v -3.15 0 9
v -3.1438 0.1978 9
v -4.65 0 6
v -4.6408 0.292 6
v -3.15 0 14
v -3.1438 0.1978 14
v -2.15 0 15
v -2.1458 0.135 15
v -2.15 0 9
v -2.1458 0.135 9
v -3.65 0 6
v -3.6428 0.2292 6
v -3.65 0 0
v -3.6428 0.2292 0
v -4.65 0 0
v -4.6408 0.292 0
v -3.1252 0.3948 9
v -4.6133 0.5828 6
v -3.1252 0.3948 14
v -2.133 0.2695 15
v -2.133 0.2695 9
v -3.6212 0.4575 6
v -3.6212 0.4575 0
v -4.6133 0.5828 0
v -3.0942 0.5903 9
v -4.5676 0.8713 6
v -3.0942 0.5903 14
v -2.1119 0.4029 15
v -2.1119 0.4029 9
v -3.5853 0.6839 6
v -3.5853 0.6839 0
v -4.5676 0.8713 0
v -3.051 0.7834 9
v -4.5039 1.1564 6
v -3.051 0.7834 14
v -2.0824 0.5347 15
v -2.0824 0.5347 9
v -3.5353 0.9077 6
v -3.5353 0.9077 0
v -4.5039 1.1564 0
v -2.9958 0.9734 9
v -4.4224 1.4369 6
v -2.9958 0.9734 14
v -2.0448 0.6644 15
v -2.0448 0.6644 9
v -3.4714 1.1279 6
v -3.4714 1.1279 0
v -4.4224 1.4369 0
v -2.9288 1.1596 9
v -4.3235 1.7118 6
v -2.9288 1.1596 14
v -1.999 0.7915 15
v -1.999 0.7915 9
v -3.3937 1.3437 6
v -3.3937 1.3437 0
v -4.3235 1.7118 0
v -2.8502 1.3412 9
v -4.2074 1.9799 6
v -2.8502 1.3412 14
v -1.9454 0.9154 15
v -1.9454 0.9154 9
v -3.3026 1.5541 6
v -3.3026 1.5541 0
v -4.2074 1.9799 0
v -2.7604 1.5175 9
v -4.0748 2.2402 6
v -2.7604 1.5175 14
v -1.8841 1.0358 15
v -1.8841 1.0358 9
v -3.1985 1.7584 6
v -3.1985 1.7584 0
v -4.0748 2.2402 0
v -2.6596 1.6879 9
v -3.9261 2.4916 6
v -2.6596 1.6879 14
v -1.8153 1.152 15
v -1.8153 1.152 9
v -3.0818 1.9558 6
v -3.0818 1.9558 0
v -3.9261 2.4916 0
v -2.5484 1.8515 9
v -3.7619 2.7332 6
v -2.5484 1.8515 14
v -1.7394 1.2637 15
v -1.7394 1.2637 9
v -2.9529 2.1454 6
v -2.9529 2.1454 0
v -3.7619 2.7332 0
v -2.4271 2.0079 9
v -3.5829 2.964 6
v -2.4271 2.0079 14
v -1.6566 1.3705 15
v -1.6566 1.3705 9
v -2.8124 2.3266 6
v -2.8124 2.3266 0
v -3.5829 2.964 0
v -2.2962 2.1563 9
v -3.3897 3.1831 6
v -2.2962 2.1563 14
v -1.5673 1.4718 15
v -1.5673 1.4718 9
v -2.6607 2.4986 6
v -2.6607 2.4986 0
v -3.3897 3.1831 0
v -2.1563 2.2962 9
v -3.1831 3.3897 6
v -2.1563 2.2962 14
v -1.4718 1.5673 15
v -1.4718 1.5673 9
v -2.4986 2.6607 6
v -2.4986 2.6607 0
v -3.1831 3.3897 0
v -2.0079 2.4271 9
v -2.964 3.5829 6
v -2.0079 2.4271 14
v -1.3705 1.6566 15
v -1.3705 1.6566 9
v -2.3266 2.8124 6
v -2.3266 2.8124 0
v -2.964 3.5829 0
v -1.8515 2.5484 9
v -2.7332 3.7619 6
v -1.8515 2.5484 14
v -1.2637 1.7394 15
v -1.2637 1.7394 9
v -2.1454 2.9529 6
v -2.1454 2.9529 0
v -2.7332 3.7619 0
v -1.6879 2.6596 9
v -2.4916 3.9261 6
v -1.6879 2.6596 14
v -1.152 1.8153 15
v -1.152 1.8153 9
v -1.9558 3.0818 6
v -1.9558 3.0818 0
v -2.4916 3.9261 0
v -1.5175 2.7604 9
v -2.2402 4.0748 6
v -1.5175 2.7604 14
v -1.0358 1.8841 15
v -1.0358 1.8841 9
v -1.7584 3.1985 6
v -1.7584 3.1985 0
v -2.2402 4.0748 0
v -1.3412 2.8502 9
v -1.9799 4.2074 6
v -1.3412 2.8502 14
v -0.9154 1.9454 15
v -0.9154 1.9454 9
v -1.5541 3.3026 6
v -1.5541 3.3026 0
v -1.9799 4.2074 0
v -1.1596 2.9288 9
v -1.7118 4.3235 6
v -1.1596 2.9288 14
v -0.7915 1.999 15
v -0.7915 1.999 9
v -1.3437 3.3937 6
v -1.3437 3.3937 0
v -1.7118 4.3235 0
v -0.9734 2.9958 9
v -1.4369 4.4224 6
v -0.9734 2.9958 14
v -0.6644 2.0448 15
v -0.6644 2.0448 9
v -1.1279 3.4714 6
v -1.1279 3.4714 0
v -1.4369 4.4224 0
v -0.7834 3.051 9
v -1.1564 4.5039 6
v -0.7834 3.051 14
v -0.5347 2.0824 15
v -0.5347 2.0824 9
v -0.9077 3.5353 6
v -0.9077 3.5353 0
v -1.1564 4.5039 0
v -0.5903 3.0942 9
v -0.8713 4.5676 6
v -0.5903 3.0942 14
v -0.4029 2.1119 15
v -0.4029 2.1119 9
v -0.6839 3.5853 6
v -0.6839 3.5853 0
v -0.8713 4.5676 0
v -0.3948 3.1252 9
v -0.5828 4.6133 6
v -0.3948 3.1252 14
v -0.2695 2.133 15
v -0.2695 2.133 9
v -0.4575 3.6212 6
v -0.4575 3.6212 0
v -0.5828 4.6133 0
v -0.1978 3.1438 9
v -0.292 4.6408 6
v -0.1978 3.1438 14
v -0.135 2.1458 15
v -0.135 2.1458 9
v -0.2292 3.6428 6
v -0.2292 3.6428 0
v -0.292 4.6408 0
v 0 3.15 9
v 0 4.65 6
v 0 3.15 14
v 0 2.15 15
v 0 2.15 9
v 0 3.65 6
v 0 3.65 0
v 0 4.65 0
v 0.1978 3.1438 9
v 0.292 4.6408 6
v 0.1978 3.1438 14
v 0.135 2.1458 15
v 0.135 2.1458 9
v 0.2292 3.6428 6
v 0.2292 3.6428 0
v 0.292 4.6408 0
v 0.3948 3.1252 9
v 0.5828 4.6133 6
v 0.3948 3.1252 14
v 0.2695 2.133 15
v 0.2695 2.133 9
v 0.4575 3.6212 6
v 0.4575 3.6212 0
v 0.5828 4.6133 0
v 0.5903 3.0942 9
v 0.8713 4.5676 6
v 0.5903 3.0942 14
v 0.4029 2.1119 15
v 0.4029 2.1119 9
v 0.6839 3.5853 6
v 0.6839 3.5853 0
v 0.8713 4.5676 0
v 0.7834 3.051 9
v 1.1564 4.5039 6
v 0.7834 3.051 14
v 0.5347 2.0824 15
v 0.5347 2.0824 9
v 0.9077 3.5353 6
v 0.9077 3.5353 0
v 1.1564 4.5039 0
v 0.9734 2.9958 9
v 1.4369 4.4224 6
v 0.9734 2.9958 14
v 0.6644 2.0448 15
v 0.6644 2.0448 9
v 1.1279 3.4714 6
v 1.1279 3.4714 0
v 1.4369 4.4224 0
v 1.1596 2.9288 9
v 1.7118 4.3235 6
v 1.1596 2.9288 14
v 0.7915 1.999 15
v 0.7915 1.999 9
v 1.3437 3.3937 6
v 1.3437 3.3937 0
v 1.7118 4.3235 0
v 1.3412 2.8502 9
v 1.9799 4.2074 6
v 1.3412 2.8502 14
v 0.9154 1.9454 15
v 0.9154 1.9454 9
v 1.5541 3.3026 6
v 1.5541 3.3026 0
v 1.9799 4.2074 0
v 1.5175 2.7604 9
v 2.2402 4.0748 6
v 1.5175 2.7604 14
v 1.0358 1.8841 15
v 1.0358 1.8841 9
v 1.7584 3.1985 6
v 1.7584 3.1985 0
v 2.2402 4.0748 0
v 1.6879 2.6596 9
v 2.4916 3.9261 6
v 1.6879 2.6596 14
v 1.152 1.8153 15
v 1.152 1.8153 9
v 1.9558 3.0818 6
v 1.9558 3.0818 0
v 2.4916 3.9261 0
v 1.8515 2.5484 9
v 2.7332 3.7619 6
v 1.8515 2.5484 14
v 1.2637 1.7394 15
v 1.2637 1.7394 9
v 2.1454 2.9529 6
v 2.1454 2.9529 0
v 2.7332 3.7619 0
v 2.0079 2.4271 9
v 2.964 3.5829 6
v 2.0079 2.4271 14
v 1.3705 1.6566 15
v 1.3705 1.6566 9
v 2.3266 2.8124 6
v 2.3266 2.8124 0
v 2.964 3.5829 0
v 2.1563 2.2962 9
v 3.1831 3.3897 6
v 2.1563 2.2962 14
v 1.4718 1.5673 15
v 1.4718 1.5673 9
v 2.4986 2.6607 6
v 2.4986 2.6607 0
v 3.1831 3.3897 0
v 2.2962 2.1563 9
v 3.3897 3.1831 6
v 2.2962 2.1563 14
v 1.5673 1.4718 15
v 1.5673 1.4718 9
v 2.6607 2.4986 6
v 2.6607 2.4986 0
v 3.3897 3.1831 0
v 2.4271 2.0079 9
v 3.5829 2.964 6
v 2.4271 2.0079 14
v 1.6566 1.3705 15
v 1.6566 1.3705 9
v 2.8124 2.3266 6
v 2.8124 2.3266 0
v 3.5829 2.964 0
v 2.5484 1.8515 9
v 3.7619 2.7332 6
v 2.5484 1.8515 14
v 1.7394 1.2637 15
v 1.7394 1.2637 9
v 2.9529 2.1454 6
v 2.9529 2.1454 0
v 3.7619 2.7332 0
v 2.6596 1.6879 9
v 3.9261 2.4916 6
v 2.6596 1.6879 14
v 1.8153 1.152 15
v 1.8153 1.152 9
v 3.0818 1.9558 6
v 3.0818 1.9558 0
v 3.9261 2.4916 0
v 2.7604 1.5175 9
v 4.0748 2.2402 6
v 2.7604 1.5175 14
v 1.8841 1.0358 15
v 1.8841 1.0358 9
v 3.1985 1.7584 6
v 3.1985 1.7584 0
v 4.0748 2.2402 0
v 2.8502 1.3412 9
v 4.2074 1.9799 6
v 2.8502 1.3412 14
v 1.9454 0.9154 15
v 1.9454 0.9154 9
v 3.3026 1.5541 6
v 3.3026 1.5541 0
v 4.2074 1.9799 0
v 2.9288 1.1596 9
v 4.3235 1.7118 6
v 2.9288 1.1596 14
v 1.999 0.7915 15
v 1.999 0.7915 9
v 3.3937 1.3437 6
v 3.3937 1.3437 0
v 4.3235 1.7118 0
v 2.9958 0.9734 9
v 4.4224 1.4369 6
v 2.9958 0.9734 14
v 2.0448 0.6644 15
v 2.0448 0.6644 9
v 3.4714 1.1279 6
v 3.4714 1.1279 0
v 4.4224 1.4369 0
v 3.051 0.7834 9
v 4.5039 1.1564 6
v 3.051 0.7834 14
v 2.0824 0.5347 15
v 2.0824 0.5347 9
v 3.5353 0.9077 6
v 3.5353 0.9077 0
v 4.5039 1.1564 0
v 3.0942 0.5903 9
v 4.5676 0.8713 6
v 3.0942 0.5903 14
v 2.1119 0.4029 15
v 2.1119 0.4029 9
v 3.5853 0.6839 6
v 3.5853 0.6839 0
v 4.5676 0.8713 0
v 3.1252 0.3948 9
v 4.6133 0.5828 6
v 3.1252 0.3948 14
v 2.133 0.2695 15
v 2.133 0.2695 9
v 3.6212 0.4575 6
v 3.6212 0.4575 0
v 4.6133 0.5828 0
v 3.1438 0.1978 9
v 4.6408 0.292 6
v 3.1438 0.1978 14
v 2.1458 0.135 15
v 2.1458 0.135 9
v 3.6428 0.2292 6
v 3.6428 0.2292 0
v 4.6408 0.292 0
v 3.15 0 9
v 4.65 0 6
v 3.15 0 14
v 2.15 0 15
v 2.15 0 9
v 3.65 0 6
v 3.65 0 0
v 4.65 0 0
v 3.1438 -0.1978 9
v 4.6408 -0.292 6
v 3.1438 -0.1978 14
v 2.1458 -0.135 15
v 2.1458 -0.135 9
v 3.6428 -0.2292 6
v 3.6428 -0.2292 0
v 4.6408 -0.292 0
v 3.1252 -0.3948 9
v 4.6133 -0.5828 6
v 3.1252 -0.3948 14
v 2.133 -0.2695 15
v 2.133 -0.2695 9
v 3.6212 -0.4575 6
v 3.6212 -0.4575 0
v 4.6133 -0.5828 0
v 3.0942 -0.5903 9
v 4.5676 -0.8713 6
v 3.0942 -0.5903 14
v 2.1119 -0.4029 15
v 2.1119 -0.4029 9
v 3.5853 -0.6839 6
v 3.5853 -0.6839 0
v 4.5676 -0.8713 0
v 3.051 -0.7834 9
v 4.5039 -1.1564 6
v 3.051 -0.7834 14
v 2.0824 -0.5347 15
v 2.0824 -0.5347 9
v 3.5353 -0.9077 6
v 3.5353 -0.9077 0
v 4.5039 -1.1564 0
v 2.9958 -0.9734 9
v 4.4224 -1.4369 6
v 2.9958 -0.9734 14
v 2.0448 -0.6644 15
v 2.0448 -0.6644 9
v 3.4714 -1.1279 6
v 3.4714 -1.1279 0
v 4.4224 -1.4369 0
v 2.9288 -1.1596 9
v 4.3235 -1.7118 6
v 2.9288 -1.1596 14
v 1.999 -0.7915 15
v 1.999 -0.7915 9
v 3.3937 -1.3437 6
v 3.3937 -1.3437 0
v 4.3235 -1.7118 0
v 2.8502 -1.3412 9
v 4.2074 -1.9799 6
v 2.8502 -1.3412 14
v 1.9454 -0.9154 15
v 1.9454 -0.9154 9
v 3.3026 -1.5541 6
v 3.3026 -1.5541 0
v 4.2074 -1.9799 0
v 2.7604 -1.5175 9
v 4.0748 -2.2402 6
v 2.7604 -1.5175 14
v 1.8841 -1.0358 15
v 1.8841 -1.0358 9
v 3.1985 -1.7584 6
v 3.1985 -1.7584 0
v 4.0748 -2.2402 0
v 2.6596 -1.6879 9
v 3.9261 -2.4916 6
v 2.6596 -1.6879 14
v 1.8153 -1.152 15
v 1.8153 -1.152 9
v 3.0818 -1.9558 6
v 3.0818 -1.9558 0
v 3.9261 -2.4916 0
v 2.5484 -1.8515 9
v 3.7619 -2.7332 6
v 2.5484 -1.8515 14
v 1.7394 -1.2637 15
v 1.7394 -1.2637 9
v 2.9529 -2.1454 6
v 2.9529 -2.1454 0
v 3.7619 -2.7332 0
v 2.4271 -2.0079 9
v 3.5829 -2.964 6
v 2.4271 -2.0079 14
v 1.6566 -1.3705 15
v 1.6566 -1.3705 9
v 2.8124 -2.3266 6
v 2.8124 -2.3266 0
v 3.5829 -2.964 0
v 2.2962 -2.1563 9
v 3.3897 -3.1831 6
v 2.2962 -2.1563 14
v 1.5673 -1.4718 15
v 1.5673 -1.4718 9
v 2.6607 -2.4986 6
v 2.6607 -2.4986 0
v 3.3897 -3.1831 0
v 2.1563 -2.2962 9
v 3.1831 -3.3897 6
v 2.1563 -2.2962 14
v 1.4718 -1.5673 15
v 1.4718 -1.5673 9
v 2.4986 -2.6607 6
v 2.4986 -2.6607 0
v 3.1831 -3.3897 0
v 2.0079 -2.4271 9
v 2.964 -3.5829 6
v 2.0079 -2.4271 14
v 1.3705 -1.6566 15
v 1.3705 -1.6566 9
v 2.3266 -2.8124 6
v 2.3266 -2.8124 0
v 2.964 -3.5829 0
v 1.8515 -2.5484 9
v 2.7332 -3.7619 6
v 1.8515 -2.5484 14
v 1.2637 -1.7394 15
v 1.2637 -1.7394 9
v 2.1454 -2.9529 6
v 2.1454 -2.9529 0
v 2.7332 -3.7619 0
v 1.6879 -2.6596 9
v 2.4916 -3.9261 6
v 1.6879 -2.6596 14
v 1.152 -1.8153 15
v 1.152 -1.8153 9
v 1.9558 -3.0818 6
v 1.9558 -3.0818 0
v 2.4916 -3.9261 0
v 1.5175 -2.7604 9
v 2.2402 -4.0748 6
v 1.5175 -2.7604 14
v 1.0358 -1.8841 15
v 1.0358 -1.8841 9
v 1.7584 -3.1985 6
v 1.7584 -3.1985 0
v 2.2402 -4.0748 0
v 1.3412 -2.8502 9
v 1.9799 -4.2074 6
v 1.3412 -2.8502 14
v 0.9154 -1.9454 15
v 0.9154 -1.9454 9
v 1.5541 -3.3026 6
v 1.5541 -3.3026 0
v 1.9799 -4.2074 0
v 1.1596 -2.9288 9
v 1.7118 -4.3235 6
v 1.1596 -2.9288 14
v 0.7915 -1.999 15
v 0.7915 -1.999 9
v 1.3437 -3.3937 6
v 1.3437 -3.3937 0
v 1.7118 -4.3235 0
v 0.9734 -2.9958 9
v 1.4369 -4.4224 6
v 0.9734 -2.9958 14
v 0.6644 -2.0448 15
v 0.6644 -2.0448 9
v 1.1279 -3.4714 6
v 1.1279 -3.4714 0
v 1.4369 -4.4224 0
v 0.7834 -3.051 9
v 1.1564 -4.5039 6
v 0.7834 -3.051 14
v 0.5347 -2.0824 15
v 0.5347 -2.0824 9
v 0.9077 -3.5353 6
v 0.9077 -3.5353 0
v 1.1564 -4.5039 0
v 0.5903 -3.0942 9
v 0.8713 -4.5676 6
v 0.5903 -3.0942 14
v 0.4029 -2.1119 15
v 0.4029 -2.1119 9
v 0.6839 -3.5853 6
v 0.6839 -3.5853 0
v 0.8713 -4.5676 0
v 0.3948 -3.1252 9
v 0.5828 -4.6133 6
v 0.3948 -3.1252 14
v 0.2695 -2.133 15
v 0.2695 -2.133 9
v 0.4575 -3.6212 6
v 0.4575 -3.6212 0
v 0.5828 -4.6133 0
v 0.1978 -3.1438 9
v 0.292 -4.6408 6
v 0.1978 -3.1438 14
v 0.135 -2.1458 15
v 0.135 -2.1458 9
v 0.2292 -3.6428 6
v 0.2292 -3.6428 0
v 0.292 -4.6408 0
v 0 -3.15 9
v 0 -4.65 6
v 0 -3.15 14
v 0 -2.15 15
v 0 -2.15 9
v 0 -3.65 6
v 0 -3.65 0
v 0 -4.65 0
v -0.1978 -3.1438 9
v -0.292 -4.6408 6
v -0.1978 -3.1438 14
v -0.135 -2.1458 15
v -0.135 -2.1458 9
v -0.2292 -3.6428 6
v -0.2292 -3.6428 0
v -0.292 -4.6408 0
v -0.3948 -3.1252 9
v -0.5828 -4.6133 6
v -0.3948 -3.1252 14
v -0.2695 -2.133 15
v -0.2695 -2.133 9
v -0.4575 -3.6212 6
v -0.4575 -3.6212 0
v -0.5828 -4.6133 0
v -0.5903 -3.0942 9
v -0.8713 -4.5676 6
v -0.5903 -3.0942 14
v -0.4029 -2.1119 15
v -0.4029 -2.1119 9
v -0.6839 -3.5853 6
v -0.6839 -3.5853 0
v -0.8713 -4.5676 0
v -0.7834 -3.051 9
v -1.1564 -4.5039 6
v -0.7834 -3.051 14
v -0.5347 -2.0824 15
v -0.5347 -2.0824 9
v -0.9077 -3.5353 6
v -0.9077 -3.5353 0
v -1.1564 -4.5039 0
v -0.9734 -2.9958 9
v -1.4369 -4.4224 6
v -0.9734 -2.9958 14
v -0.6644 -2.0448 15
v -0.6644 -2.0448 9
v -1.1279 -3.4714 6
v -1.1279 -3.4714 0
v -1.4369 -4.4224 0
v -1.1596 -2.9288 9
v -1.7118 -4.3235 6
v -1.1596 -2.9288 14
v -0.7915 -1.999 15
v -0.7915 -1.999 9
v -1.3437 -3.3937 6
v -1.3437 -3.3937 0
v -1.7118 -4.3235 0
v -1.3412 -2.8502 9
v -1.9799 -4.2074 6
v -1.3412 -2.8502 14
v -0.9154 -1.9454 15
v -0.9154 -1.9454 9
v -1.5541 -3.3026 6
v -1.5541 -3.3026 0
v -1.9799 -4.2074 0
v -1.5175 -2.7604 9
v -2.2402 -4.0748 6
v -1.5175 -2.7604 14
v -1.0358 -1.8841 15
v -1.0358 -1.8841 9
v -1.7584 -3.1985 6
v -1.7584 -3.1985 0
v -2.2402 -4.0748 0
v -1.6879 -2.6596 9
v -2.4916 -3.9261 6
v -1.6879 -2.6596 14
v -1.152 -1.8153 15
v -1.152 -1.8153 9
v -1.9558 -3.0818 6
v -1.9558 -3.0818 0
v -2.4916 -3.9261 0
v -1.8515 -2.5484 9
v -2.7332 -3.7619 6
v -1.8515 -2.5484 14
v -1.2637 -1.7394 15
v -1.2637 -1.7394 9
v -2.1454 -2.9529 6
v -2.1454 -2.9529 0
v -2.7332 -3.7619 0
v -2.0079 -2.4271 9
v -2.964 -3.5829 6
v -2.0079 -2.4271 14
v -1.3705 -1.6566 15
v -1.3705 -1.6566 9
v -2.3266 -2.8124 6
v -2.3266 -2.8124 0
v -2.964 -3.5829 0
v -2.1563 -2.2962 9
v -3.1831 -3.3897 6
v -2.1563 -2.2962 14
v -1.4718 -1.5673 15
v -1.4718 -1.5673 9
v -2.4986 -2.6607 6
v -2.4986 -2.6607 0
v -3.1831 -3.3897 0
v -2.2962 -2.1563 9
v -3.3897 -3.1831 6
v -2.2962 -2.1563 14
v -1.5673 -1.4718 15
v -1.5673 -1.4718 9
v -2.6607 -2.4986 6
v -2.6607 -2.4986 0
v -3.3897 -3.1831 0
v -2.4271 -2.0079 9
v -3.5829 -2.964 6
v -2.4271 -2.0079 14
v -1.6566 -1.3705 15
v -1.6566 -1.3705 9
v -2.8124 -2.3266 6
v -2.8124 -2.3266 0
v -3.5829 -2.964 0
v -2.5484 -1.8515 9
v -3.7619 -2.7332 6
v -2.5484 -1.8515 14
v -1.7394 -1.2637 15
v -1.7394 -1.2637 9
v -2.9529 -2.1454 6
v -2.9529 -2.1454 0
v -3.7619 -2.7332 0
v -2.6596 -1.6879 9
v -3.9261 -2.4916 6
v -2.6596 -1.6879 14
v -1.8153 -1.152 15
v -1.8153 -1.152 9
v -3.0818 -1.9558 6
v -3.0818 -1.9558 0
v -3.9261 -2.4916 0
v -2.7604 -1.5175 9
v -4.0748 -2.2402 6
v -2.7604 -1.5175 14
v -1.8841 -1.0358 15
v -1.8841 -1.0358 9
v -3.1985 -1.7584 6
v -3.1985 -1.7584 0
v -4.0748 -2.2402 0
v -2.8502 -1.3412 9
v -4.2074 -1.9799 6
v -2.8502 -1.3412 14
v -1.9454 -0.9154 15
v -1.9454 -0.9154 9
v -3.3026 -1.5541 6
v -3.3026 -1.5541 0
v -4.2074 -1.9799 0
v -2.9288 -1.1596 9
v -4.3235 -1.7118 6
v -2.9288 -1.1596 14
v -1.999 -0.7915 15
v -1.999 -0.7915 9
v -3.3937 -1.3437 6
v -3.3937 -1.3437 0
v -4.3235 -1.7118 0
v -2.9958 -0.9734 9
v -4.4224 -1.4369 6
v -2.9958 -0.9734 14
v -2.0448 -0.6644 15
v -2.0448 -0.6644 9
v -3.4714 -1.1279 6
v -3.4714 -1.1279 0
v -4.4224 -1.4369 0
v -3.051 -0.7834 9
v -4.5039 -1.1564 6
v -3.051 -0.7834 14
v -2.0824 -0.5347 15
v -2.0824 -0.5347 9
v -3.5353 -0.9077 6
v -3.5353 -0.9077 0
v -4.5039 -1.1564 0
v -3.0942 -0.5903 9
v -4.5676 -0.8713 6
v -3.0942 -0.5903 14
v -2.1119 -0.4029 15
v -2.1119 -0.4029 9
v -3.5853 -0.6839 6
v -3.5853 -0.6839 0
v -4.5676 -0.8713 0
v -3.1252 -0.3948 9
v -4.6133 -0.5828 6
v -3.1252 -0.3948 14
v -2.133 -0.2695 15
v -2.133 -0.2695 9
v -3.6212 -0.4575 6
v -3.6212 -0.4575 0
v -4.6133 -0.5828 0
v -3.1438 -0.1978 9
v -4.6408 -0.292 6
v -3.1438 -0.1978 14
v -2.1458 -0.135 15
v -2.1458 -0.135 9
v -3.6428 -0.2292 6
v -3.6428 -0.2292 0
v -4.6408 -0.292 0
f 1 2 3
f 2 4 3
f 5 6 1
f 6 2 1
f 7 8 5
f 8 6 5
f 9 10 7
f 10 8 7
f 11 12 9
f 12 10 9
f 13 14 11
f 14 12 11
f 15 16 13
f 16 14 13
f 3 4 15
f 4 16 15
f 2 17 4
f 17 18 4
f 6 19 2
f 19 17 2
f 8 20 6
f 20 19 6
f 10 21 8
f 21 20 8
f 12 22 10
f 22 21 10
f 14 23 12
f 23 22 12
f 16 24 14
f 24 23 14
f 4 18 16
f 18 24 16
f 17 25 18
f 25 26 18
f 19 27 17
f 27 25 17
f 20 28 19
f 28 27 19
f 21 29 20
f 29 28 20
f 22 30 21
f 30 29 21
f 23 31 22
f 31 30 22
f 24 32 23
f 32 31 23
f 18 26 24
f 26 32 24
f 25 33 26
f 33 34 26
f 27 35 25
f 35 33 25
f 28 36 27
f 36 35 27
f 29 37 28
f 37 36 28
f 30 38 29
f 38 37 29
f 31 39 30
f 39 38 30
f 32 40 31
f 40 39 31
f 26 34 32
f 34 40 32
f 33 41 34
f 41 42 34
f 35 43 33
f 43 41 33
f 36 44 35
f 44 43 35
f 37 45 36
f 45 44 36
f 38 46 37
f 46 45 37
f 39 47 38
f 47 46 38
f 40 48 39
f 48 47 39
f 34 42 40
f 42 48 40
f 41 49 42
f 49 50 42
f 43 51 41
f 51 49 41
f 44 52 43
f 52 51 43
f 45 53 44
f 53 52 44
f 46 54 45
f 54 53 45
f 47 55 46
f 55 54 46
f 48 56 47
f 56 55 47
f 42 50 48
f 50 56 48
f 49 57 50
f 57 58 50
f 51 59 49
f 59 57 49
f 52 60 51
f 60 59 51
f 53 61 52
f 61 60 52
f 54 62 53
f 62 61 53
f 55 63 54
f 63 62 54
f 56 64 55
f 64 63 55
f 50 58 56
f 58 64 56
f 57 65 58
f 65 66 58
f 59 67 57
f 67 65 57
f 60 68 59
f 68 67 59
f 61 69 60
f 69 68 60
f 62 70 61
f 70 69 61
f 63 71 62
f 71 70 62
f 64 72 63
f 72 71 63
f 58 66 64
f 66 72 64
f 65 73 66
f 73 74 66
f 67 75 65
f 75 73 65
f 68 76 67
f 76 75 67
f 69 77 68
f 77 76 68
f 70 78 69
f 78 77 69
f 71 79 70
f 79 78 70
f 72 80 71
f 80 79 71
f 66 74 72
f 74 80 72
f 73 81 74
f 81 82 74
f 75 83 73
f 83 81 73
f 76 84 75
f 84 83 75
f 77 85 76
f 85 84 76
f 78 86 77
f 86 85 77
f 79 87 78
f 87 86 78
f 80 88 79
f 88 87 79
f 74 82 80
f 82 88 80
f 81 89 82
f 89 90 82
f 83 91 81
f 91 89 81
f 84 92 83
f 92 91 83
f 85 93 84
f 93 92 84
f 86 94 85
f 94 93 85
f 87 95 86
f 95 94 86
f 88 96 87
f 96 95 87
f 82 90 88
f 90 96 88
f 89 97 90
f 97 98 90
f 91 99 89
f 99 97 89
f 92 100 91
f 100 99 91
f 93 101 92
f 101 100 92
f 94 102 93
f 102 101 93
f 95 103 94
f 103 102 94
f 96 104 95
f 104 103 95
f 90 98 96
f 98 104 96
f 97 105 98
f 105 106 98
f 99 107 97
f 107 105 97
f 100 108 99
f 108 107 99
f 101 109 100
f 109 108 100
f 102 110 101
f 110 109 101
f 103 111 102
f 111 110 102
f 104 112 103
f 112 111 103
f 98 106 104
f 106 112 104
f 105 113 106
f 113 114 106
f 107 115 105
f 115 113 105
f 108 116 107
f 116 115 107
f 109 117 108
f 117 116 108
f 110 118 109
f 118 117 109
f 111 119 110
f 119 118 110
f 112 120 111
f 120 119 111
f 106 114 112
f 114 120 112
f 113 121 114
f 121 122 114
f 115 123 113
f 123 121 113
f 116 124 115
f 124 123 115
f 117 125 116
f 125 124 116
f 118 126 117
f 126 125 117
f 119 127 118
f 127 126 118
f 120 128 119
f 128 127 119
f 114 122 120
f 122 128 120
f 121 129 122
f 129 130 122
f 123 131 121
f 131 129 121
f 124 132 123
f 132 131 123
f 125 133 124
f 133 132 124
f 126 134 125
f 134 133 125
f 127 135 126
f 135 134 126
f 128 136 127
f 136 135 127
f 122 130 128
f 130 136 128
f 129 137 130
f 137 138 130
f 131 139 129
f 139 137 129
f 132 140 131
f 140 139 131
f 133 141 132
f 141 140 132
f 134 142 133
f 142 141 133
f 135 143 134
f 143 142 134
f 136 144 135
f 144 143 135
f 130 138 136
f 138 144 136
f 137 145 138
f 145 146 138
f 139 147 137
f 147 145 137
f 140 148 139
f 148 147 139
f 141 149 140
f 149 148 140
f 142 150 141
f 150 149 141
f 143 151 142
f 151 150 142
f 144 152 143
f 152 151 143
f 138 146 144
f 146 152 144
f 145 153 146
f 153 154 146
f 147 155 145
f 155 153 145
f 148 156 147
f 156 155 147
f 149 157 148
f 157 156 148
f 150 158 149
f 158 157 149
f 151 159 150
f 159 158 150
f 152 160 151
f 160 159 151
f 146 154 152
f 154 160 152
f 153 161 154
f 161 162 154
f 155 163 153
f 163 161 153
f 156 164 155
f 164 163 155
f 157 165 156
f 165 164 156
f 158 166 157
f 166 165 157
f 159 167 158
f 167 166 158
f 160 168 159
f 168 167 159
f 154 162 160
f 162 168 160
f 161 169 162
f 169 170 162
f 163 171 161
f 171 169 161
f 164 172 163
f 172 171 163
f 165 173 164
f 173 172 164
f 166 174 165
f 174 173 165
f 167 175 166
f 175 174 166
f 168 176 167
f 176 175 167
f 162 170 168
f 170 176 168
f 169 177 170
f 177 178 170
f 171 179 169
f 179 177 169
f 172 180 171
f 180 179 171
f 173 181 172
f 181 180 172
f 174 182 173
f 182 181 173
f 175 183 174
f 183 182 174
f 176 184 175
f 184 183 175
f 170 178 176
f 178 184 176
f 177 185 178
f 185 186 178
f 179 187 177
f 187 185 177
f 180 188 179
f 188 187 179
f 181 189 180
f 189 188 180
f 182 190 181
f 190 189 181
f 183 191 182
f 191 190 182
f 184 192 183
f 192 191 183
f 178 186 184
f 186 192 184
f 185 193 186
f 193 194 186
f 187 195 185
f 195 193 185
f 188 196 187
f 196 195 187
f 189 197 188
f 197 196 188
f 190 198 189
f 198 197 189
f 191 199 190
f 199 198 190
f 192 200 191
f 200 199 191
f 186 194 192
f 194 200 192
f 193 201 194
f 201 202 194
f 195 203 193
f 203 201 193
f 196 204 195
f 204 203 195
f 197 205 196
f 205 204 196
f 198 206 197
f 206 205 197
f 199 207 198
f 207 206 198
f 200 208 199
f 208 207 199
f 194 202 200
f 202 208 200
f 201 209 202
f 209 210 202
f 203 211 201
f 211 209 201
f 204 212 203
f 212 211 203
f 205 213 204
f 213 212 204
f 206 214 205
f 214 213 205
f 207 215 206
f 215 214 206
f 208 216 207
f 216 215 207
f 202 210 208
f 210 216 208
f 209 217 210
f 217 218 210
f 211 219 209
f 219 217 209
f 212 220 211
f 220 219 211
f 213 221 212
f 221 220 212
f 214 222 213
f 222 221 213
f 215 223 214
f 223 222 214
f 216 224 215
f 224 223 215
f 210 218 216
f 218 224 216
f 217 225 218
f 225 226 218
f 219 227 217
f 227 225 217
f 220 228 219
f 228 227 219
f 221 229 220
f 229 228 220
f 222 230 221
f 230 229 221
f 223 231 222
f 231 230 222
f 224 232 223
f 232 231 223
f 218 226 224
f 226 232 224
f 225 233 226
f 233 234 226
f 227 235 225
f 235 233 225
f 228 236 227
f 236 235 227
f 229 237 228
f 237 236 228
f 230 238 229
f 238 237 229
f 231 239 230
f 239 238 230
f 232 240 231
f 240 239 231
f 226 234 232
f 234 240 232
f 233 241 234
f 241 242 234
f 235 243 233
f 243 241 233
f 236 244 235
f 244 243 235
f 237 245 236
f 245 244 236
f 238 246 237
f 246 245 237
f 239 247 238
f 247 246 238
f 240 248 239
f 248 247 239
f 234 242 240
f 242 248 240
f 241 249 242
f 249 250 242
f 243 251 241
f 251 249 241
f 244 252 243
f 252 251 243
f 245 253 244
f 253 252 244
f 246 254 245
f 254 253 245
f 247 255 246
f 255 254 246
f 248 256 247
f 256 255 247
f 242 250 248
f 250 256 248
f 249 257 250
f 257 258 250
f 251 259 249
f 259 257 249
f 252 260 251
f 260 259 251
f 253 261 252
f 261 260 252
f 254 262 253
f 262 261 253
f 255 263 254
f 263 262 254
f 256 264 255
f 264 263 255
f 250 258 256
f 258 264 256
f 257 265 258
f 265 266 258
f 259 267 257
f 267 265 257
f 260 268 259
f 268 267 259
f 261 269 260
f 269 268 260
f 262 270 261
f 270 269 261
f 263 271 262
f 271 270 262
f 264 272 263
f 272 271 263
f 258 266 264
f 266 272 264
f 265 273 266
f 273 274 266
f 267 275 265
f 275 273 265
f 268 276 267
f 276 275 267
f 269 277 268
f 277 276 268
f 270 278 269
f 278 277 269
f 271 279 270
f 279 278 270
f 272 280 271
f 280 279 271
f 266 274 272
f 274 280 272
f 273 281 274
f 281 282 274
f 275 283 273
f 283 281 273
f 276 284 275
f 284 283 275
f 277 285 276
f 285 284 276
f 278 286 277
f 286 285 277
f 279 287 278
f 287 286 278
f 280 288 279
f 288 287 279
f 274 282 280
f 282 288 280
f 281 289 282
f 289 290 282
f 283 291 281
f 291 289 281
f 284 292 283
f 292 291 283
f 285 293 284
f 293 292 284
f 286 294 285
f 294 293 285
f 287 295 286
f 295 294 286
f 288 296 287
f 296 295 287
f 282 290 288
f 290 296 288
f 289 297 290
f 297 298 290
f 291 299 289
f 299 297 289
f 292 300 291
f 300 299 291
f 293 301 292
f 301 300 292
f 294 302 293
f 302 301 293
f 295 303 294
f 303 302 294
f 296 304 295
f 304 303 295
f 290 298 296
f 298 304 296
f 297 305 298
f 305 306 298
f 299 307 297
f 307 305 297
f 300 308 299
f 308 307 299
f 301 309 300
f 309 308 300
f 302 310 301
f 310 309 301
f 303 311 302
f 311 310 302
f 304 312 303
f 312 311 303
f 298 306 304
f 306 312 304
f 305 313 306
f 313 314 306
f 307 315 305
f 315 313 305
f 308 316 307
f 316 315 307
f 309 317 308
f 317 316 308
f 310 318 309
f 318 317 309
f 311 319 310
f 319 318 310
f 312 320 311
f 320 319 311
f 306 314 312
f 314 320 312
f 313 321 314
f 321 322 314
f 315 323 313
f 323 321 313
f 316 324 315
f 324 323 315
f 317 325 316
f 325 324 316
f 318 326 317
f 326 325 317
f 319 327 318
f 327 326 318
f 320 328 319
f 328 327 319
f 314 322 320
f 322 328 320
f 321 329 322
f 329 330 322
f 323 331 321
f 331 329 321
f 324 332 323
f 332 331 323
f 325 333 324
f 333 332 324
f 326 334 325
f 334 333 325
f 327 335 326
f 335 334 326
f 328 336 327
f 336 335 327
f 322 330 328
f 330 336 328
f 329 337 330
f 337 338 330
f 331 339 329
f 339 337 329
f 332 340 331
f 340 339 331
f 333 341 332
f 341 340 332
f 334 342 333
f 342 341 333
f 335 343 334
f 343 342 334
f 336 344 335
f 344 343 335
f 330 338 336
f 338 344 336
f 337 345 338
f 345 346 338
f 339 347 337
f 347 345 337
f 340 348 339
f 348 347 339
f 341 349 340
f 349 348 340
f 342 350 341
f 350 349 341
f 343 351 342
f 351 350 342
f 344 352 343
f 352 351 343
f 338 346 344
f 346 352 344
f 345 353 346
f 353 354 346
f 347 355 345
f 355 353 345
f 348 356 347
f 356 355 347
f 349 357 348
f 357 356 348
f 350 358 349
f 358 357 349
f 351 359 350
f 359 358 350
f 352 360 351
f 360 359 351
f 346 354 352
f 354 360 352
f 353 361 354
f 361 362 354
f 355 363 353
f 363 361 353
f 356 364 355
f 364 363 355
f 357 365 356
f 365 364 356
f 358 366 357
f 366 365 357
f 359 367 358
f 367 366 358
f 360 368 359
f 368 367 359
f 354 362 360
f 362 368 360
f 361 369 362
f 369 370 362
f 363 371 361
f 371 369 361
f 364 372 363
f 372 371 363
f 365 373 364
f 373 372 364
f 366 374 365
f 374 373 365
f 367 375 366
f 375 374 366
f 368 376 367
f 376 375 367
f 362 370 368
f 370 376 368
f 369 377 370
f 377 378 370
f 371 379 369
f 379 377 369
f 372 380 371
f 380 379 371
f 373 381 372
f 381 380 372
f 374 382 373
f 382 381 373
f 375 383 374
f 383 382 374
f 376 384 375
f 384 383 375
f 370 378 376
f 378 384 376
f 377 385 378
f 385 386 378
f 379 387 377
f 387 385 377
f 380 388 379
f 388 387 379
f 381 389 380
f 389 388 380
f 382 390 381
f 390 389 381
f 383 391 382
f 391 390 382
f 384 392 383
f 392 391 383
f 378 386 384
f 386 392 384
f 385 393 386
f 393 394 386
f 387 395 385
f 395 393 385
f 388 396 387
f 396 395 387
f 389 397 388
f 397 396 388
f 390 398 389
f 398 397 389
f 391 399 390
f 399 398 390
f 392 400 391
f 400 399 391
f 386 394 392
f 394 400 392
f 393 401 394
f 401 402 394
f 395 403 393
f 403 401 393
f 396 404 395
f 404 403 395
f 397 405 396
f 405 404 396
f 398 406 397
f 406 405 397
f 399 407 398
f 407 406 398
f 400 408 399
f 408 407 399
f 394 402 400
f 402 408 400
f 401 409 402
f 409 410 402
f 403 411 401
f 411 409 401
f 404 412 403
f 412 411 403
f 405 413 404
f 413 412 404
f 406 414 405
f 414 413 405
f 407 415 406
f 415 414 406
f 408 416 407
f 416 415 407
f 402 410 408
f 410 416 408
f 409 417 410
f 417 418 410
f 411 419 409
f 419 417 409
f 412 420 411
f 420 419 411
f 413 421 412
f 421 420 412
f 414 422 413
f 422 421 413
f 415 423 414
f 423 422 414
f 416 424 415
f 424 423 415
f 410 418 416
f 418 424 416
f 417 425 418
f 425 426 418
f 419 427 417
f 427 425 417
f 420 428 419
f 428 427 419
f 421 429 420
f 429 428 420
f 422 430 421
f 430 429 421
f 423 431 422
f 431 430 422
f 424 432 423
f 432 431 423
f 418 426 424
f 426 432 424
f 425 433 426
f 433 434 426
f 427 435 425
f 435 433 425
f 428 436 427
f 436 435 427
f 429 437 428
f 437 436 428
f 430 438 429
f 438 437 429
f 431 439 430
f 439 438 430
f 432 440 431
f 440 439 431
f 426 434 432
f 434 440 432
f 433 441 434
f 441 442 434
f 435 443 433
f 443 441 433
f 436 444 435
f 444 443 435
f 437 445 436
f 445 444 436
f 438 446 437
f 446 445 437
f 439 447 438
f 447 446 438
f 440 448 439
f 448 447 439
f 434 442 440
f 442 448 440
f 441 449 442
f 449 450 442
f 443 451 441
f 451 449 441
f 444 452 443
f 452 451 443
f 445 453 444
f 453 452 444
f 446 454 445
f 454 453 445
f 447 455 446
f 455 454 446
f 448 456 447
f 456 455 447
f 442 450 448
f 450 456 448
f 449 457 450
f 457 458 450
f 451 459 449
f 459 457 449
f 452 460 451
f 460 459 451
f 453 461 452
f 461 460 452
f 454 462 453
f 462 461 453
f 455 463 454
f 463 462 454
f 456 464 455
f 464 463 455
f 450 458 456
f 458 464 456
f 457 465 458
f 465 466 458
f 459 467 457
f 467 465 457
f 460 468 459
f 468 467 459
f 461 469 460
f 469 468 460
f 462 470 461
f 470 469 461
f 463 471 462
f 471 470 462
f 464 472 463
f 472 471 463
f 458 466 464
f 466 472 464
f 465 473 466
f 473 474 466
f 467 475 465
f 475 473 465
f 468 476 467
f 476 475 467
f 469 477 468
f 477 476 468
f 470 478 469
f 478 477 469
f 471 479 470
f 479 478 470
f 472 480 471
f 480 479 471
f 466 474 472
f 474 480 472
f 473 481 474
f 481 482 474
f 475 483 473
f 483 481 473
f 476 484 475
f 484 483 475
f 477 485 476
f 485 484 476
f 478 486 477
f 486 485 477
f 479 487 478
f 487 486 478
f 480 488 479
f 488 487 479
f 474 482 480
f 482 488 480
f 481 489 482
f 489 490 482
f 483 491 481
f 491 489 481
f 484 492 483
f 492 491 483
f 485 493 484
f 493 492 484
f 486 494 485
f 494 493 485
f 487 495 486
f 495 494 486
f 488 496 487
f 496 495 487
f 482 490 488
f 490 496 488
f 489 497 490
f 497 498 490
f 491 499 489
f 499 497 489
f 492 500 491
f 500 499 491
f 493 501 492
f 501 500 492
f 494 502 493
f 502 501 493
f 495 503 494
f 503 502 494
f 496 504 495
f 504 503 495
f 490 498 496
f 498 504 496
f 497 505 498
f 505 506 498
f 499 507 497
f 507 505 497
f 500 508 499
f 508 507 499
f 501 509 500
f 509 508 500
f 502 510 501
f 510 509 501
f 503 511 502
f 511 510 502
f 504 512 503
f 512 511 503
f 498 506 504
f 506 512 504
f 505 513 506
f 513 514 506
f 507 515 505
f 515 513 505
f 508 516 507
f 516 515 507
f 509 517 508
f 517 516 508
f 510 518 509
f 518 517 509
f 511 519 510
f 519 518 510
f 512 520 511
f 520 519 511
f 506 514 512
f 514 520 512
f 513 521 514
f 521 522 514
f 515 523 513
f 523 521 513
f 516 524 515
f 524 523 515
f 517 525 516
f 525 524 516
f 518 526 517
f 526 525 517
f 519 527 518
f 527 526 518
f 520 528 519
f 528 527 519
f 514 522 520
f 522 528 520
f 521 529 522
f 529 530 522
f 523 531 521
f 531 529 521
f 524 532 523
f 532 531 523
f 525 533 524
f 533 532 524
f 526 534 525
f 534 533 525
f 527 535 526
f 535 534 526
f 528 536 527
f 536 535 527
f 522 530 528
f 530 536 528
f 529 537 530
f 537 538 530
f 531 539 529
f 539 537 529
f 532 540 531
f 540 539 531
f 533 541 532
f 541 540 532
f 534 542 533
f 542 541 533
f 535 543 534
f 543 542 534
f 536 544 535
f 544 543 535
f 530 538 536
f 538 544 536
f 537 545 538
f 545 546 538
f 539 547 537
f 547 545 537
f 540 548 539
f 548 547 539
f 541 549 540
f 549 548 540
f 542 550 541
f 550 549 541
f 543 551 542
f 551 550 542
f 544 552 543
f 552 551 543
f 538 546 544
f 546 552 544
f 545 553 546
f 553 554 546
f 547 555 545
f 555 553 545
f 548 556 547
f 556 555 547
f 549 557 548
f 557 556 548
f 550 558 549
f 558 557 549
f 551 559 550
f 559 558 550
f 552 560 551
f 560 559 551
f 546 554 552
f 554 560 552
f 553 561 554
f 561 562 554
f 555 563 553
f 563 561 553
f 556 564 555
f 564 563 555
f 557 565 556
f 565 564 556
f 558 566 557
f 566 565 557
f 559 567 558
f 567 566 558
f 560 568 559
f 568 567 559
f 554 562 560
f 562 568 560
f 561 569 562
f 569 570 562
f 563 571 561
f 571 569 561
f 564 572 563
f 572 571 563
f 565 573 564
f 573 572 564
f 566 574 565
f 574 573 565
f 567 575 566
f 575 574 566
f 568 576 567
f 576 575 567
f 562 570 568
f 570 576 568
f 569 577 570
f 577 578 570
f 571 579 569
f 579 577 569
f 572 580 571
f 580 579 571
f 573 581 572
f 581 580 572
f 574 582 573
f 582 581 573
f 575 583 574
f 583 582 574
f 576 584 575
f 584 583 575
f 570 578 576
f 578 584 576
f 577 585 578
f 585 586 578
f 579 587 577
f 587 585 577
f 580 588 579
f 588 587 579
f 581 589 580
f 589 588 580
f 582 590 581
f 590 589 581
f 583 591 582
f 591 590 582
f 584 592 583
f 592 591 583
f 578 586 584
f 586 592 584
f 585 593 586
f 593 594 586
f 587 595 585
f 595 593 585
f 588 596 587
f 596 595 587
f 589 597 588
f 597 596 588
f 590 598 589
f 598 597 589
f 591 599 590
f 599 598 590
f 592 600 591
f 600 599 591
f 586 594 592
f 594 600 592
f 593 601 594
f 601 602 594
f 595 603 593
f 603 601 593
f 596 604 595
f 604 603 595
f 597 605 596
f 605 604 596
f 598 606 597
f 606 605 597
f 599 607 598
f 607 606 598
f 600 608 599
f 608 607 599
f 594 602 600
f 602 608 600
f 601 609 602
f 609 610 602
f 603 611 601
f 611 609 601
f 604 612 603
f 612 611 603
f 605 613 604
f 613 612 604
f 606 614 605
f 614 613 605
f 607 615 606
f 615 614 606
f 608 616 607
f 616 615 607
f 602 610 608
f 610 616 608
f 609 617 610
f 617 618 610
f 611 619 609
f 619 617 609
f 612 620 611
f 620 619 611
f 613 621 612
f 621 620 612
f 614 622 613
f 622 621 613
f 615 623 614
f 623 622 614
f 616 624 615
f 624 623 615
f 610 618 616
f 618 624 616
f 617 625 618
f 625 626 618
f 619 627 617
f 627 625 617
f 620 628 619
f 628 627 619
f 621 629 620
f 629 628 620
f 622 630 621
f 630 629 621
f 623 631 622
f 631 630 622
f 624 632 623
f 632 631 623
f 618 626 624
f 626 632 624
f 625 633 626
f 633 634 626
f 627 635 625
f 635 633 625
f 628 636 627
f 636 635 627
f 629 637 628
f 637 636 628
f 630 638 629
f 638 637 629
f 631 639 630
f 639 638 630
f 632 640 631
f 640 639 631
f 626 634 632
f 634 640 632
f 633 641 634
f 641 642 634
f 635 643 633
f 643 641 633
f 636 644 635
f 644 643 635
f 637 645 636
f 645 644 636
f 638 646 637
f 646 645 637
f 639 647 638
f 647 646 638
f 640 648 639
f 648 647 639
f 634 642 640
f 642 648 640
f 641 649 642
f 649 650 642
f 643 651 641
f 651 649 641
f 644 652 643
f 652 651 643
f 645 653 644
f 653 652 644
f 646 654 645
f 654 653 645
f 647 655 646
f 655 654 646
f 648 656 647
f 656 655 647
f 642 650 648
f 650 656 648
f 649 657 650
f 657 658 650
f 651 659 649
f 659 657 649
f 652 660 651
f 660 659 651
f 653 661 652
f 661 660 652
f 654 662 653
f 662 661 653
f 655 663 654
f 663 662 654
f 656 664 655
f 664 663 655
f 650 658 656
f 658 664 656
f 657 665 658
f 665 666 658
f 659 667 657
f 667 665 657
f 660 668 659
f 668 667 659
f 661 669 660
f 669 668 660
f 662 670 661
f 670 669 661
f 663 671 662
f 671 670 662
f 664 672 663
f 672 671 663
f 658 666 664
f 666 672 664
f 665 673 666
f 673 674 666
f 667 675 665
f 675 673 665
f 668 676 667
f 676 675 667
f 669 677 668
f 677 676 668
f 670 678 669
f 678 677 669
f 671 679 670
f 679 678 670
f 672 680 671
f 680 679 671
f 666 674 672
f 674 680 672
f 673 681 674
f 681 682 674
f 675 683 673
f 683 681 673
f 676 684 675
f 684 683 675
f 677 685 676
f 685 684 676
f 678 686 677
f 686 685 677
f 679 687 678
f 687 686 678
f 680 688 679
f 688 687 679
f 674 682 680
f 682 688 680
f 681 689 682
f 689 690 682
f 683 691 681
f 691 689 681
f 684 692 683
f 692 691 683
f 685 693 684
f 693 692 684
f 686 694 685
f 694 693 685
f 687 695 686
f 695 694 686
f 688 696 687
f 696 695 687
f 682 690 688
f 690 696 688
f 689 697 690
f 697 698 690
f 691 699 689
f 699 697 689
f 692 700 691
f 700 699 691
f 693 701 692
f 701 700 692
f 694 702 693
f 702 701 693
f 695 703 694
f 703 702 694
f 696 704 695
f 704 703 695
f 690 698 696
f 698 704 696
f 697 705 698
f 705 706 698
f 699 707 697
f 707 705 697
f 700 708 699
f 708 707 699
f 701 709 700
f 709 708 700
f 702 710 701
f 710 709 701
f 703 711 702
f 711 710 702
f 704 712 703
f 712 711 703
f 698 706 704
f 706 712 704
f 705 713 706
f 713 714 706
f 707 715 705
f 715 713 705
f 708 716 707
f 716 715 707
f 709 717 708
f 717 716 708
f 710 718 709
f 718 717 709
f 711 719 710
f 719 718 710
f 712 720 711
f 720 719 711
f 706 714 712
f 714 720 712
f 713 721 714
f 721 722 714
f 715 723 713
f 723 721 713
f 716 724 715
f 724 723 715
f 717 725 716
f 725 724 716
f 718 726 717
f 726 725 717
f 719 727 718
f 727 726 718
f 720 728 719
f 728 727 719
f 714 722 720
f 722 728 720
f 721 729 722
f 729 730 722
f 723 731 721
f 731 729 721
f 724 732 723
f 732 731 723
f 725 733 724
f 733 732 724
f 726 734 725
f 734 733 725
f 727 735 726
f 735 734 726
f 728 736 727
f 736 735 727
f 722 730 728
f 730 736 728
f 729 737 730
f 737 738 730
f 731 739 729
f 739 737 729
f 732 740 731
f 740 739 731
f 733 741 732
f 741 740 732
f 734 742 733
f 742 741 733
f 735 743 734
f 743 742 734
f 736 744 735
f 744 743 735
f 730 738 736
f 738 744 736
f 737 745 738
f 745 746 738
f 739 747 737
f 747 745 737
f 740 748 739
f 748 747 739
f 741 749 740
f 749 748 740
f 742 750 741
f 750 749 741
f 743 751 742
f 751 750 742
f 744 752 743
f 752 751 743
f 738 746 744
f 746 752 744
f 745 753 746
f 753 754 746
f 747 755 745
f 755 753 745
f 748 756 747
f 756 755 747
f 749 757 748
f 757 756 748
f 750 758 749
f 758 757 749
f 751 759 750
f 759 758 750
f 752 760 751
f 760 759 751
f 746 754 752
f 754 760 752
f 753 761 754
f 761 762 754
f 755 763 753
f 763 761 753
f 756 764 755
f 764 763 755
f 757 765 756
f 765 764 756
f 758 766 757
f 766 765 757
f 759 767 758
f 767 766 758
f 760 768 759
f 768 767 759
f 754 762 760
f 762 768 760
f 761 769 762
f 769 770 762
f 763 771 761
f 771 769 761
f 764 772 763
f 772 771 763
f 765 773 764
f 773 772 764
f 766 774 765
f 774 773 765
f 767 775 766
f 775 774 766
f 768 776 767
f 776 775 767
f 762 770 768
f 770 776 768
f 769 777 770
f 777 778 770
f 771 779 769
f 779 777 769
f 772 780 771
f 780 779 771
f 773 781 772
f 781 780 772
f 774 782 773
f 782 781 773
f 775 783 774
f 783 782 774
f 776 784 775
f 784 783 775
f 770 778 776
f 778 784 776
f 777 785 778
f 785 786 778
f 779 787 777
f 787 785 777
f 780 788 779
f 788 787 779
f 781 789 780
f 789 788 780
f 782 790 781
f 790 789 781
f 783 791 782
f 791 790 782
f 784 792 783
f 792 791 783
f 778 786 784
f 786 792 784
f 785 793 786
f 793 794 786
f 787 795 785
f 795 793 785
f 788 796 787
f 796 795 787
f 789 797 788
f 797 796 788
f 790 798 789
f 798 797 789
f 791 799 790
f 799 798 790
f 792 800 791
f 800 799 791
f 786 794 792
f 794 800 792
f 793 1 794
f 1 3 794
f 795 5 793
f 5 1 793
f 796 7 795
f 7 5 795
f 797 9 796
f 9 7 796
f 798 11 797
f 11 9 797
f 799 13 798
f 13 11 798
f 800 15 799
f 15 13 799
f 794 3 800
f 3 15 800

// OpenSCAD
module adapter_template(pipe_inner_diameter, outlet_outer_diameter, wall_thickness, slope_length, section_length) {
	polygon([
		[outlet_outer_diameter / 2, 0],
		[outlet_outer_diameter / 2, section_length] ,
		[pipe_inner_diameter / 2, section_length + slope_length],
		[pipe_inner_diameter / 2, 2 * section_length + slope_length],
		[pipe_inner_diameter / 2 + wall_thickness, 2 * section_length + slope_length - wall_thickness],
		[pipe_inner_diameter / 2 + wall_thickness, section_length + slope_length],
		[outlet_outer_diameter / 2 + wall_thickness, section_length] ,
		[outlet_outer_diameter / 2 + wall_thickness, 0],
	]);
}

color("white") rotate_extrude($fn = 100) adapter_template(4.3, 7.3, 1, 3, 6);
